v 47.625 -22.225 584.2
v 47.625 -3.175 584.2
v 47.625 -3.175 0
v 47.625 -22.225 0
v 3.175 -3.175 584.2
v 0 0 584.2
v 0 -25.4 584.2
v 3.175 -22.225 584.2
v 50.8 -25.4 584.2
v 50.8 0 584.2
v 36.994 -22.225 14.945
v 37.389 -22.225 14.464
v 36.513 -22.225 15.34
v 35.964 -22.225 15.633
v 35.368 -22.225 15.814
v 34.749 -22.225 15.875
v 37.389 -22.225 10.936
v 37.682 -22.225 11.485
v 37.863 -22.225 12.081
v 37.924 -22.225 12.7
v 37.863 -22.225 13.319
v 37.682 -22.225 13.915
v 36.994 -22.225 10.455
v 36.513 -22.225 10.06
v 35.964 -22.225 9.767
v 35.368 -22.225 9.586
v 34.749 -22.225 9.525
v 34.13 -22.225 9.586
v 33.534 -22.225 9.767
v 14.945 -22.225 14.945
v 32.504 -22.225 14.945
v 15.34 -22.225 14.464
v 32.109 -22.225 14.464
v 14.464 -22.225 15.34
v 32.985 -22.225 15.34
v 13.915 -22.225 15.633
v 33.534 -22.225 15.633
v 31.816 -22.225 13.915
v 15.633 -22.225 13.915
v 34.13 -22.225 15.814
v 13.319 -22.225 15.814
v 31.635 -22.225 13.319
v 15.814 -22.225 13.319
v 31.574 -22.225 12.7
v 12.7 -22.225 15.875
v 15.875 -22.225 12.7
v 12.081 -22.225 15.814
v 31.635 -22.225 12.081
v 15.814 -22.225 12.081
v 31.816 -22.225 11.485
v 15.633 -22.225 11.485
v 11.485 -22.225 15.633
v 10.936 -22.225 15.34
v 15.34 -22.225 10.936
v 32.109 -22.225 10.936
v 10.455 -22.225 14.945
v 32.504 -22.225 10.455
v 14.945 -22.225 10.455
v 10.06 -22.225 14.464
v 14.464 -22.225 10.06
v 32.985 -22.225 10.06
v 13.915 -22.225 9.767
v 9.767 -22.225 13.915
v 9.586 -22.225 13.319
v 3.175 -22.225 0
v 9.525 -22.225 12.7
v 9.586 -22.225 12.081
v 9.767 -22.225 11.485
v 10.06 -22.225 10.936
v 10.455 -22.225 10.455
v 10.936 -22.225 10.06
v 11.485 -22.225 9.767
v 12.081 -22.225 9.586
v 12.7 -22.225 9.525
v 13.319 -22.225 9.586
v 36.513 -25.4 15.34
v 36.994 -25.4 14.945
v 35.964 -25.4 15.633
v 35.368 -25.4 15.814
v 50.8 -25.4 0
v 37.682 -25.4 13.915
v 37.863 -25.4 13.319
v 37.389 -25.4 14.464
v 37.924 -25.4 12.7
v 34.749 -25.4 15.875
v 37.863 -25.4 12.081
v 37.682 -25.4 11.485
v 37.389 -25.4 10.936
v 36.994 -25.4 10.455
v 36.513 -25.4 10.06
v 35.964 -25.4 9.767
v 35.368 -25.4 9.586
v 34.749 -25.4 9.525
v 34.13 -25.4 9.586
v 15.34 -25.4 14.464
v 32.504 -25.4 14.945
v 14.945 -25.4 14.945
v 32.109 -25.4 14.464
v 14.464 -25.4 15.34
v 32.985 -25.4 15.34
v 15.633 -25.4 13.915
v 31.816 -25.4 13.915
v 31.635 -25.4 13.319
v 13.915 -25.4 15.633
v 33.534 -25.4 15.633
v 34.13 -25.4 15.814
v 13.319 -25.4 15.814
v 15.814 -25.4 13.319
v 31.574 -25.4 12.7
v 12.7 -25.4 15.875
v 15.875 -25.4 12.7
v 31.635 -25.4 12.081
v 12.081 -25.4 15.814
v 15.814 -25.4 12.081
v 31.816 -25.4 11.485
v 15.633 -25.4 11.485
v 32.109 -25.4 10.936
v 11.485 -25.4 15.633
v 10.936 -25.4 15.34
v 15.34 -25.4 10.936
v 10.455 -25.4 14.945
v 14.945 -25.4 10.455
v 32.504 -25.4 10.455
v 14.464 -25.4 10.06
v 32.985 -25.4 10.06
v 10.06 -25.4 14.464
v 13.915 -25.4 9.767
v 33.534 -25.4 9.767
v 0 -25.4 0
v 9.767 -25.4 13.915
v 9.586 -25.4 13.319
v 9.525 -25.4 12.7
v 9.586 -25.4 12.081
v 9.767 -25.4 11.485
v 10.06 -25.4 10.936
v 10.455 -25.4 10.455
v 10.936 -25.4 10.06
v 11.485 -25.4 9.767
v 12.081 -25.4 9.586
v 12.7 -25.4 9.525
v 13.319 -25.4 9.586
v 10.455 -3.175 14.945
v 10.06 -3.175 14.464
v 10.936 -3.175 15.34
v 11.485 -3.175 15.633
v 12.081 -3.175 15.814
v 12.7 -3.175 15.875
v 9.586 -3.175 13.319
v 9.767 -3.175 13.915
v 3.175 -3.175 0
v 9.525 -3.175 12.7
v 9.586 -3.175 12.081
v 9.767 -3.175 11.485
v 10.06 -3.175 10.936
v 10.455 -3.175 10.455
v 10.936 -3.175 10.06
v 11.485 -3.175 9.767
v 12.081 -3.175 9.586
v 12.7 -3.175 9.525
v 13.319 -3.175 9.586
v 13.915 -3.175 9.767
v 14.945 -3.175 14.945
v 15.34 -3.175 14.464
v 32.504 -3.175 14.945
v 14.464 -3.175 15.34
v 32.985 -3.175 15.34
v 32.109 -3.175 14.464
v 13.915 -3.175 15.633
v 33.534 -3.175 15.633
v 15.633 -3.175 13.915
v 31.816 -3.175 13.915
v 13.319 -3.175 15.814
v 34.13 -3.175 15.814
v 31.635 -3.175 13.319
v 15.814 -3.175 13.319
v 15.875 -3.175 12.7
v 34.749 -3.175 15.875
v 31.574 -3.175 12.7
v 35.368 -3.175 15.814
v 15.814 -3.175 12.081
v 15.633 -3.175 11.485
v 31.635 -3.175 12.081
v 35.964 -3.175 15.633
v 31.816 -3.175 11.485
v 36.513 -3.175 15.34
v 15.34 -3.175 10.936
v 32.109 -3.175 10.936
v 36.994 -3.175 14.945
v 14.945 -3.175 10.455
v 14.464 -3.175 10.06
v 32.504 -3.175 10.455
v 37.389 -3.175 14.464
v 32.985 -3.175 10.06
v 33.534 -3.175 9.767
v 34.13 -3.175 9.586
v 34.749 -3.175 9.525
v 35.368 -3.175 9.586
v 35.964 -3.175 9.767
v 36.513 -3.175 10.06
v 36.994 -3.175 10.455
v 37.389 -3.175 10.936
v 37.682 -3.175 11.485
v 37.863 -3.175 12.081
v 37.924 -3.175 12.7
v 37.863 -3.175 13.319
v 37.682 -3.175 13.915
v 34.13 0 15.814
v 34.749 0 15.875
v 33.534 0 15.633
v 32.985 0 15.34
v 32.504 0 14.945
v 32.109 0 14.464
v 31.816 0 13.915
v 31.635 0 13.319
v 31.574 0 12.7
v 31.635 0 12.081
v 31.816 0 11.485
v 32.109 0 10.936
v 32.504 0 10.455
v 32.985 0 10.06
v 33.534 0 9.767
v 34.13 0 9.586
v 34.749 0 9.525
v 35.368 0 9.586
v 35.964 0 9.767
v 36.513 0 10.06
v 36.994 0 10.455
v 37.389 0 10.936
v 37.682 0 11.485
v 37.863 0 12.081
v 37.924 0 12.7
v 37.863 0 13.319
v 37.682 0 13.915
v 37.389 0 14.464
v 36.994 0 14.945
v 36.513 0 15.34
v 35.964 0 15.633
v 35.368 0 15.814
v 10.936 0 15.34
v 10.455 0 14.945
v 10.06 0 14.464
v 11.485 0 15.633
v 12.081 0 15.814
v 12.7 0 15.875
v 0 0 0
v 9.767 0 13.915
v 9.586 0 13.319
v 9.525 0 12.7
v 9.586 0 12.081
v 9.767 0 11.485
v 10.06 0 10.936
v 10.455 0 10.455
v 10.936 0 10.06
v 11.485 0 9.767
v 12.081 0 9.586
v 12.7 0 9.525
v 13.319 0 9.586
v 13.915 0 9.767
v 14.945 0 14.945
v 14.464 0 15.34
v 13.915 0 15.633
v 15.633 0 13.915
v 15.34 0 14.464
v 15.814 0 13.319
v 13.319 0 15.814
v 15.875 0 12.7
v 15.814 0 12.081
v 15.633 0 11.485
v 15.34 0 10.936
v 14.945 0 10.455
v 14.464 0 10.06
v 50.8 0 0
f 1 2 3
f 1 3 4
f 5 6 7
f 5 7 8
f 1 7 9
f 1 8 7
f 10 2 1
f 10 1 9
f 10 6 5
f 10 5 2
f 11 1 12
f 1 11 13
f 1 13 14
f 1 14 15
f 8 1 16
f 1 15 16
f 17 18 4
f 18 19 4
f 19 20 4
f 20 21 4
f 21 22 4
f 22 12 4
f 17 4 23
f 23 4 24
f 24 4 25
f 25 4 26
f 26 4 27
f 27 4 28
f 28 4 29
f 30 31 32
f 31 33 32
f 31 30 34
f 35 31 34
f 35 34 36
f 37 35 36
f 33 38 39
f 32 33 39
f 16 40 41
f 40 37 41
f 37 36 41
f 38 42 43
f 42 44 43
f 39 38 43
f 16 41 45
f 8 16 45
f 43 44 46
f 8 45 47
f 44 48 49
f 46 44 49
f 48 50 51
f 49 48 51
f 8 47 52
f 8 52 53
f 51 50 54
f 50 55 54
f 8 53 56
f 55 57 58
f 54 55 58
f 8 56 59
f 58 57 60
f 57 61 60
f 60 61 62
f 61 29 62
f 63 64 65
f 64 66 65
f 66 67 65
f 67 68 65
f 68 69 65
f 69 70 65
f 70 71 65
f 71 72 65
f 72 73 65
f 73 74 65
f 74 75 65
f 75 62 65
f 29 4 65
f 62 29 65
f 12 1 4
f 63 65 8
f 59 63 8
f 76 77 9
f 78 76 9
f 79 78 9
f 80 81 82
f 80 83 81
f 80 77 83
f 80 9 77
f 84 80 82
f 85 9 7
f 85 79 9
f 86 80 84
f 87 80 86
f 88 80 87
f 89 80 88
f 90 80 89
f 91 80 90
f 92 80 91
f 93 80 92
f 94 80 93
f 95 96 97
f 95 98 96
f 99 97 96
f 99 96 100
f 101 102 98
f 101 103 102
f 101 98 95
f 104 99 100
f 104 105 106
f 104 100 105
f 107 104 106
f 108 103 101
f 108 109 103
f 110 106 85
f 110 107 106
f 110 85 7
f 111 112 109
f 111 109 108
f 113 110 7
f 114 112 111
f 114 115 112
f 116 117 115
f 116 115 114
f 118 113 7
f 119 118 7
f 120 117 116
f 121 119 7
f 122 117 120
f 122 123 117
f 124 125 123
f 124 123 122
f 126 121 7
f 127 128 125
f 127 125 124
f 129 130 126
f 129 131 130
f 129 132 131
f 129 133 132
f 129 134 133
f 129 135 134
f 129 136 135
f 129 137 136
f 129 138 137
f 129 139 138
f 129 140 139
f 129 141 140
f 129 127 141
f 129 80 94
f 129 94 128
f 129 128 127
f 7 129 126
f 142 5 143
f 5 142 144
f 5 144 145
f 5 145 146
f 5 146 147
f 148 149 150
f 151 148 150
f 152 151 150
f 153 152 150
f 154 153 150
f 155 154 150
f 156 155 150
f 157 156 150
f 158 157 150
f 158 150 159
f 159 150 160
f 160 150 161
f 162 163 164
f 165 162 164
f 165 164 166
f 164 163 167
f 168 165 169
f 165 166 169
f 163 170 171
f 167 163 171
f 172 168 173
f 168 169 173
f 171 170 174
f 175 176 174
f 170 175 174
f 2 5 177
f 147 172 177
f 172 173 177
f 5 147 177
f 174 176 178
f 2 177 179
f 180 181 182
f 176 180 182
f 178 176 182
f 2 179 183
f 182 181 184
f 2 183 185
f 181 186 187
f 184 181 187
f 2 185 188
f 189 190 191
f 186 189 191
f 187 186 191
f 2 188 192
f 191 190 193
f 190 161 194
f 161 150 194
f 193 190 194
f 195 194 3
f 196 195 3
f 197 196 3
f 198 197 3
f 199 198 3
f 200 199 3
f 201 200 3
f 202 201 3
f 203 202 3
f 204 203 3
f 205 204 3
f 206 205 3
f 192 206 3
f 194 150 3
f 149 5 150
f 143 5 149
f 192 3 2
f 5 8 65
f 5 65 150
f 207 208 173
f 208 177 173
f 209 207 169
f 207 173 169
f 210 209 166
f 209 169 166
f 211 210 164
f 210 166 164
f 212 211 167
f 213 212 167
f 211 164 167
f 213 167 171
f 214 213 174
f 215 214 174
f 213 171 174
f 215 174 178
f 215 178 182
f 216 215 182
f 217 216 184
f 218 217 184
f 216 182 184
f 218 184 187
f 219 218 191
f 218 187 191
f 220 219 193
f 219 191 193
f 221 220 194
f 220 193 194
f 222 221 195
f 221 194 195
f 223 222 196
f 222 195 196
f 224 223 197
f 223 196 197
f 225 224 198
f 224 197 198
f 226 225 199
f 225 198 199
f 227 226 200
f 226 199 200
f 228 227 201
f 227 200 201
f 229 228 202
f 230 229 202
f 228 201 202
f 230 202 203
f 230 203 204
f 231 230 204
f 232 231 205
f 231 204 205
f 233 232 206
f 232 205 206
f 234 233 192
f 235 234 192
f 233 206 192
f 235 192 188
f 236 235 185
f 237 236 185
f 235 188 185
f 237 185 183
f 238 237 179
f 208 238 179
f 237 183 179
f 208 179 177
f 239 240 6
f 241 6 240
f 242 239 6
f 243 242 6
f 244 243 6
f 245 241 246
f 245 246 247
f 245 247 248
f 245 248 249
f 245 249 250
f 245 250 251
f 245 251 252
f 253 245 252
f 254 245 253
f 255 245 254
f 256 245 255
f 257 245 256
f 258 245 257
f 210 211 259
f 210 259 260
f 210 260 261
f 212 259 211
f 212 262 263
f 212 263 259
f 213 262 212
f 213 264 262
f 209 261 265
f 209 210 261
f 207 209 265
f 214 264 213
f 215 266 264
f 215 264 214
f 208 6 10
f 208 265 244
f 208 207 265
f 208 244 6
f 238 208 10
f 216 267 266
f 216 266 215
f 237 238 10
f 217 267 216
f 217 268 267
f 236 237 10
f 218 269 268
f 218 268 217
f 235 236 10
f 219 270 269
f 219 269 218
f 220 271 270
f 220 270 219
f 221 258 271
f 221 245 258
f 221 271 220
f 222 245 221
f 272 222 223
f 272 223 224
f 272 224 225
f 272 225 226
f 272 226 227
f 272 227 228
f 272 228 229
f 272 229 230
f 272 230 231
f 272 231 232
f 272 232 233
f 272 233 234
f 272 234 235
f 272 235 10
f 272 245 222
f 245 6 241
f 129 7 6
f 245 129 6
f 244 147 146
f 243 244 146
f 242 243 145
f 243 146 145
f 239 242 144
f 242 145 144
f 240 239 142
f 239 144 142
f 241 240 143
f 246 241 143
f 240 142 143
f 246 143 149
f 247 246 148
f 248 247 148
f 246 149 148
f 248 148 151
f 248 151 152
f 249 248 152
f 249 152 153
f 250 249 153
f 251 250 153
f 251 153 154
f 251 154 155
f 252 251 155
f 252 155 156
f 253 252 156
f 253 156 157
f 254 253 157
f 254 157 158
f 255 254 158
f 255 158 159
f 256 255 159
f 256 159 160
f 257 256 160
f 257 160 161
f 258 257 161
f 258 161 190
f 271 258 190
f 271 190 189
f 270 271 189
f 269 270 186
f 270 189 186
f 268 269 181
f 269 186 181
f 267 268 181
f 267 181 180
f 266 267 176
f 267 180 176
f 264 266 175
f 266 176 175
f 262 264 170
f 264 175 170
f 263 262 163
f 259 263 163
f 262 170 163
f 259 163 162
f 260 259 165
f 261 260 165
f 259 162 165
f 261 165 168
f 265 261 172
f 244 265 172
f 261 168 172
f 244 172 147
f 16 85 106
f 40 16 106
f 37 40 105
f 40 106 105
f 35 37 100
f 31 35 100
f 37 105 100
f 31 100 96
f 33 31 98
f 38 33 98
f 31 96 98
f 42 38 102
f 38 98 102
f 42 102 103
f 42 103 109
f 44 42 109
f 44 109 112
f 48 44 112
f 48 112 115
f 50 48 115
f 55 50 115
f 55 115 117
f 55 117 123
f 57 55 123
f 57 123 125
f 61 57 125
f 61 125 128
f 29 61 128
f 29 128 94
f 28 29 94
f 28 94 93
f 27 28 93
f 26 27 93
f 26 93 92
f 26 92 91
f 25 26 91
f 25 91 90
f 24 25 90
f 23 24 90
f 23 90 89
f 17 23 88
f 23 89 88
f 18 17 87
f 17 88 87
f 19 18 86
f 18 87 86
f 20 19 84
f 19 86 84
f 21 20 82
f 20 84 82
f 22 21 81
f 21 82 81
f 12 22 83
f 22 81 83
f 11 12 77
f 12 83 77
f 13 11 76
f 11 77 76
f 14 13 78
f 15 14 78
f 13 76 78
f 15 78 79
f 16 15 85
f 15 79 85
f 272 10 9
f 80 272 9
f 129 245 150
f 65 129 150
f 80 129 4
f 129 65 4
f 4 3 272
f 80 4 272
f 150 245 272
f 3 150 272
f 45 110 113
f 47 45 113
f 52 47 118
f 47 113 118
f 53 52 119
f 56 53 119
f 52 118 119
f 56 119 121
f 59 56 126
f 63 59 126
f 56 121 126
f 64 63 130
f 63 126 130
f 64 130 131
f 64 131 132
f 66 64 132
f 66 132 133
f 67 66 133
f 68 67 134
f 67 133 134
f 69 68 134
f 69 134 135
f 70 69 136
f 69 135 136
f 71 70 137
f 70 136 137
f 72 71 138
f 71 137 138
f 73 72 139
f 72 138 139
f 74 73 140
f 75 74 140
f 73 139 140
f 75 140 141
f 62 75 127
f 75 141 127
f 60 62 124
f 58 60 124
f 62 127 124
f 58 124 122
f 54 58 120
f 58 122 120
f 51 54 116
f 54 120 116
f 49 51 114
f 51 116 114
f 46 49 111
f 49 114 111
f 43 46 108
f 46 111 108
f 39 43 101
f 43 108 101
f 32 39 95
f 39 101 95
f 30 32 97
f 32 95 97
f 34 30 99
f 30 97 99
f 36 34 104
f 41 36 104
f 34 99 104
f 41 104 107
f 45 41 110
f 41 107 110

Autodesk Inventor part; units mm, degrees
ref_plane "YZ Plane" through (0, 0, 0) normal (1, 0, 0) x (0, 1, 0)
ref_plane "XZ Plane" through (0, 0, 0) normal (0, 1, 0) x (-1, 0, 0)
ref_plane "XY Plane" through (0, 0, 0) normal (0, 0, 1) x (1, 0, 0)
sketch "Sketch1" plane through (0, 0, 0) normal (0, 0, 1) x (1, 0, 0)
  line L0 (0, 0) -> (50.8, 0)
  line L1 (50.8, 0) -> (50.8, -25.4)
  line L2 (50.8, -25.4) -> (0, -25.4)
  line L3 (0, -25.4) -> (0, 0)
  line L4 (3.175, -3.175) -> (47.625, -3.175)
  line L5 (47.625, -3.175) -> (47.625, -22.225)
  line L6 (47.625, -22.225) -> (3.175, -22.225)
  line L7 (3.175, -22.225) -> (3.175, -3.175)
  dimension "d0" = 50.8
  dimension "d1" = 25.4
  dimension "d2" = 44.45
  dimension "d3" = 19.05
  dimension "d4" = 3.175
  dimension "d5" = 3.175
extrude "Extrusion1" add sketch "Sketch1" along normal blind 584.2
sketch "Sketch2" plane through (0, 0, 0) normal (0, 1, 0) x (1, 0, 0)
  circle A0 centre (12.7, -12.7) radius 3.175
  line L0 (3.175, 0) -> (47.625, 0) projected
  line L1 (23.7245, 0) -> (23.7245, -584.2)
  line L2 (47.625, -584.2) -> (3.175, -584.2) projected
  line L3 (23.7245, 0) -> (607.9245, 0) construction
  line L4 (0, 0) -> (0, -584.2) projected
  circle A1 centre (34.749, -12.7) radius 3.175
  line L5 (0, -311.15) -> (50.8388, -311.15)
  line L6 (47.625, 0) -> (47.625, -584.2) projected
  circle A2 centre (12.7, -609.6) radius 3.175
  circle A3 centre (34.749, -609.6) radius 3.175
  dimension "d8" = 6.35
  dimension "d9" = 90
  dimension "d10" = 12.7
  dimension "d11" = 12.7
  dimension "d12" = 311.15
hole "Hole1" at (12.7, 0, 609.6) at (34.749, 0, 609.6) at (12.7, 0, 12.7) at (34.749, 0, 12.7) direction (0, -1, 0) diameter 6.35 depth 25.4 tip angle 118
properties part number "support beam 2"
